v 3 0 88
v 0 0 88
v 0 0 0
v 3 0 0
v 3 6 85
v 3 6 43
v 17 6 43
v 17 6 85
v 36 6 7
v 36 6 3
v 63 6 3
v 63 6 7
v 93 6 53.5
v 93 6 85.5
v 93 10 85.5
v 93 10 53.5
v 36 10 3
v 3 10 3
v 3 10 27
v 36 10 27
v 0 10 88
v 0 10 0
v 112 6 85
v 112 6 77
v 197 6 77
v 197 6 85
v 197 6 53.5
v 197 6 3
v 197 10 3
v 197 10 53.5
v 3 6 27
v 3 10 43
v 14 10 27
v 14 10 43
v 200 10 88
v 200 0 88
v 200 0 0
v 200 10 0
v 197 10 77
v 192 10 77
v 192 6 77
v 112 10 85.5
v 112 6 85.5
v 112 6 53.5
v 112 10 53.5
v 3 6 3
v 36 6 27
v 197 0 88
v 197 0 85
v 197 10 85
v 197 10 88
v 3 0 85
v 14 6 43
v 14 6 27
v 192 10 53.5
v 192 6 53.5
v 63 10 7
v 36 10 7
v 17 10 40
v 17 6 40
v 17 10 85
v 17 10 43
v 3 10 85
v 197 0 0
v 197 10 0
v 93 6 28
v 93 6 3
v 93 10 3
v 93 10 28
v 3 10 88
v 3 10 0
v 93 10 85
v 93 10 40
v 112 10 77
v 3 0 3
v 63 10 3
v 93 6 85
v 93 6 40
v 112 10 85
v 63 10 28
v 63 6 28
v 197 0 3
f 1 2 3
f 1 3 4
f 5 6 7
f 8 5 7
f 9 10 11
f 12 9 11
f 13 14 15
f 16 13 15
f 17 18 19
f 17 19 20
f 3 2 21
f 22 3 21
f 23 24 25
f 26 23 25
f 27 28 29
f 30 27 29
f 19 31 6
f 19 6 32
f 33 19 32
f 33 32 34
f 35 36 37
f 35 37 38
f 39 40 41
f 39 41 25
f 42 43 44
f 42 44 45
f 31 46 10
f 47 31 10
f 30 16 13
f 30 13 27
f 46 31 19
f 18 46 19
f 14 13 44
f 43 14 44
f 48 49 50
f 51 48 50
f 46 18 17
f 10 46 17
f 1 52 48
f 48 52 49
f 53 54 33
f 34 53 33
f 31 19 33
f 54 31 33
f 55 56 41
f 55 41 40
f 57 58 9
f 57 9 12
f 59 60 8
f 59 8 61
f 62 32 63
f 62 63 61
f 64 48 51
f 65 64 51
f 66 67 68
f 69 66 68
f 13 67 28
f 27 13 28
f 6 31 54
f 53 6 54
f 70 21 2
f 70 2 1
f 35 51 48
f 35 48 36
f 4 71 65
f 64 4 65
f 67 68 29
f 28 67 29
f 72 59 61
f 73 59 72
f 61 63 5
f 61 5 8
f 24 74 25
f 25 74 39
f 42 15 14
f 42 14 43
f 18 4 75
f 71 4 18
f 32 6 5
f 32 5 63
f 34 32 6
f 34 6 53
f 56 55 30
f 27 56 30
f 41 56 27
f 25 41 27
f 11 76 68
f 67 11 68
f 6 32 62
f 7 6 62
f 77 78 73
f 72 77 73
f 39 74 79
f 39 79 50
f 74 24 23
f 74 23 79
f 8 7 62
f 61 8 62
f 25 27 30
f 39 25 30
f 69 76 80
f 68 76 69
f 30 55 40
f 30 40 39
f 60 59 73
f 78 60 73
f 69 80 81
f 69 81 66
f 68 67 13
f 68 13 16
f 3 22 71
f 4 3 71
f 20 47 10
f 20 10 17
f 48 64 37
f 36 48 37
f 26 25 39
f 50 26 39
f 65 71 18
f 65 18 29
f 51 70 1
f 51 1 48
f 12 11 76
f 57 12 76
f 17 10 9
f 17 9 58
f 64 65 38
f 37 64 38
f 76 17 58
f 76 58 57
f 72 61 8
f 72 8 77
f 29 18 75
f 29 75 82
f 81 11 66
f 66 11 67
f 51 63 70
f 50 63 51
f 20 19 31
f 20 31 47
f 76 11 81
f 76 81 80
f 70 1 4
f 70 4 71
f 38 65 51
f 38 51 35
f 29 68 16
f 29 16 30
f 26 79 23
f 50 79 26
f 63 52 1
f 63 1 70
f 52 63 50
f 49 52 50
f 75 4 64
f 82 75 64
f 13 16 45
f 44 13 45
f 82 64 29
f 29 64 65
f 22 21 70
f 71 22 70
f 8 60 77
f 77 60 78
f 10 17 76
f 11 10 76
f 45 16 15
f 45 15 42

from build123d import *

# Parameters (mm, degrees)
BOX_W        = 3
BOX_H        = 10
BOX_DEPTH    = 88
BOX001_W     = 194
BOX001_H     = 10
BOX001_DEPTH = 3
BOX002_W     = 3
BOX002_H     = 10
BOX002_DEPTH = 88
BOX003_W     = 194
BOX003_H     = 10
BOX003_DEPTH = 3
BOX004_W     = 104
BOX004_H     = 4
BOX004_DEPTH = 50.5
BOX005_W     = 5
BOX005_H     = 4
BOX005_DEPTH = 23.5
BOX006_W     = 85
BOX006_H     = 4
BOX006_DEPTH = 8
BOX007_W     = 19
BOX007_H     = 4
BOX007_DEPTH = 32
BOX009_W     = 76
BOX009_H     = 4
BOX009_DEPTH = 45
BOX010_W     = 30
BOX010_H     = 4
BOX010_DEPTH = 25
BOX011_W     = 27
BOX011_H     = 4
BOX011_DEPTH = 4
BOX012_W     = 33
BOX012_H     = 4
BOX012_DEPTH = 24
BOX013_W     = 14
BOX013_H     = 4
BOX013_DEPTH = 42
BOX014_W     = 11
BOX014_H     = 4
BOX014_DEPTH = 16


with BuildPart() as box:
    # Box → Box (new body)
    with BuildSketch(Plane.XY):
        with Locations((1.5, 5)):
            Rectangle(BOX_W, BOX_H)
    extrude(amount=BOX_DEPTH)


with BuildPart() as box001:
    # Box001 → Box001 (new body)
    with BuildSketch(Plane(origin=(3, 0, 0), x_dir=(1, 0, 0), z_dir=(0, 0, 1))):
        with Locations((97, 5)):
            Rectangle(BOX001_W, BOX001_H)
    extrude(amount=BOX001_DEPTH)


with BuildPart() as box002:
    # Box002 → Box002 (new body)
    with BuildSketch(Plane(origin=(197, 0, 0), x_dir=(1, 0, 0), z_dir=(0, 0, 1))):
        with Locations((1.5, 5)):
            Rectangle(BOX002_W, BOX002_H)
    extrude(amount=BOX002_DEPTH)


with BuildPart() as box003:
    # Box003 → Box003 (new body)
    with BuildSketch(Plane(origin=(3, 0, 85), x_dir=(1, 0, 0), z_dir=(0, 0, 1))):
        with Locations((97, 5)):
            Rectangle(BOX003_W, BOX003_H)
    extrude(amount=BOX003_DEPTH)


with BuildPart() as box004:
    # Box004 → Box004 (new body)
    with BuildSketch(Plane(origin=(93, 6, 3), x_dir=(1, 0, 0), z_dir=(0, 0, 1))):
        with Locations((52, 2)):
            Rectangle(BOX004_W, BOX004_H)
    extrude(amount=BOX004_DEPTH)


with BuildPart() as box005:
    # Box005 → Box005 (new body)
    with BuildSketch(Plane(origin=(192, 6, 53.5), x_dir=(1, 0, 0), z_dir=(0, 0, 1))):
        with Locations((2.5, 2)):
            Rectangle(BOX005_W, BOX005_H)
    extrude(amount=BOX005_DEPTH)


with BuildPart() as box006:
    # Box006 → Box006 (new body)
    with BuildSketch(Plane(origin=(112, 6, 77), x_dir=(1, 0, 0), z_dir=(0, 0, 1))):
        with Locations((42.5, 2)):
            Rectangle(BOX006_W, BOX006_H)
    extrude(amount=BOX006_DEPTH)


with BuildPart() as box007:
    # Box007 → Box007 (new body)
    with BuildSketch(Plane(origin=(93, 6, 53.5), x_dir=(1, 0, 0), z_dir=(0, 0, 1))):
        with Locations((9.5, 2)):
            Rectangle(BOX007_W, BOX007_H)
    extrude(amount=BOX007_DEPTH)


with BuildPart() as box009:
    # Box009 → Box009 (new body)
    with BuildSketch(Plane(origin=(17, 6, 40), x_dir=(1, 0, 0), z_dir=(0, 0, 1))):
        with Locations((38, 2)):
            Rectangle(BOX009_W, BOX009_H)
    extrude(amount=BOX009_DEPTH)


with BuildPart() as box010:
    # Box010 → Box010 (new body)
    with BuildSketch(Plane(origin=(63, 6, 3), x_dir=(1, 0, 0), z_dir=(0, 0, 1))):
        with Locations((15, 2)):
            Rectangle(BOX010_W, BOX010_H)
    extrude(amount=BOX010_DEPTH)


with BuildPart() as box011:
    # Box011 → Box011 (new body)
    with BuildSketch(Plane(origin=(36, 6, 3), x_dir=(1, 0, 0), z_dir=(0, 0, 1))):
        with Locations((13.5, 2)):
            Rectangle(BOX011_W, BOX011_H)
    extrude(amount=BOX011_DEPTH)


with BuildPart() as box012:
    # Box012 → Box012 (new body)
    with BuildSketch(Plane(origin=(3, 6, 3), x_dir=(1, 0, 0), z_dir=(0, 0, 1))):
        with Locations((16.5, 2)):
            Rectangle(BOX012_W, BOX012_H)
    extrude(amount=BOX012_DEPTH)


with BuildPart() as box013:
    # Box013 → Box013 (new body)
    with BuildSketch(Plane(origin=(3, 6, 43), x_dir=(1, 0, 0), z_dir=(0, 0, 1))):
        with Locations((7, 2)):
            Rectangle(BOX013_W, BOX013_H)
    extrude(amount=BOX013_DEPTH)


with BuildPart() as box014:
    # Box014 → Box014 (new body)
    with BuildSketch(Plane(origin=(3, 6, 27), x_dir=(1, 0, 0), z_dir=(0, 0, 1))):
        with Locations((5.5, 2)):
            Rectangle(BOX014_W, BOX014_H)
    extrude(amount=BOX014_DEPTH)


solid = Compound([box.part, box001.part, box002.part, box003.part, box004.part, box005.part, box006.part, box007.part, box009.part, box010.part, box011.part, box012.part, box013.part, box014.part])
